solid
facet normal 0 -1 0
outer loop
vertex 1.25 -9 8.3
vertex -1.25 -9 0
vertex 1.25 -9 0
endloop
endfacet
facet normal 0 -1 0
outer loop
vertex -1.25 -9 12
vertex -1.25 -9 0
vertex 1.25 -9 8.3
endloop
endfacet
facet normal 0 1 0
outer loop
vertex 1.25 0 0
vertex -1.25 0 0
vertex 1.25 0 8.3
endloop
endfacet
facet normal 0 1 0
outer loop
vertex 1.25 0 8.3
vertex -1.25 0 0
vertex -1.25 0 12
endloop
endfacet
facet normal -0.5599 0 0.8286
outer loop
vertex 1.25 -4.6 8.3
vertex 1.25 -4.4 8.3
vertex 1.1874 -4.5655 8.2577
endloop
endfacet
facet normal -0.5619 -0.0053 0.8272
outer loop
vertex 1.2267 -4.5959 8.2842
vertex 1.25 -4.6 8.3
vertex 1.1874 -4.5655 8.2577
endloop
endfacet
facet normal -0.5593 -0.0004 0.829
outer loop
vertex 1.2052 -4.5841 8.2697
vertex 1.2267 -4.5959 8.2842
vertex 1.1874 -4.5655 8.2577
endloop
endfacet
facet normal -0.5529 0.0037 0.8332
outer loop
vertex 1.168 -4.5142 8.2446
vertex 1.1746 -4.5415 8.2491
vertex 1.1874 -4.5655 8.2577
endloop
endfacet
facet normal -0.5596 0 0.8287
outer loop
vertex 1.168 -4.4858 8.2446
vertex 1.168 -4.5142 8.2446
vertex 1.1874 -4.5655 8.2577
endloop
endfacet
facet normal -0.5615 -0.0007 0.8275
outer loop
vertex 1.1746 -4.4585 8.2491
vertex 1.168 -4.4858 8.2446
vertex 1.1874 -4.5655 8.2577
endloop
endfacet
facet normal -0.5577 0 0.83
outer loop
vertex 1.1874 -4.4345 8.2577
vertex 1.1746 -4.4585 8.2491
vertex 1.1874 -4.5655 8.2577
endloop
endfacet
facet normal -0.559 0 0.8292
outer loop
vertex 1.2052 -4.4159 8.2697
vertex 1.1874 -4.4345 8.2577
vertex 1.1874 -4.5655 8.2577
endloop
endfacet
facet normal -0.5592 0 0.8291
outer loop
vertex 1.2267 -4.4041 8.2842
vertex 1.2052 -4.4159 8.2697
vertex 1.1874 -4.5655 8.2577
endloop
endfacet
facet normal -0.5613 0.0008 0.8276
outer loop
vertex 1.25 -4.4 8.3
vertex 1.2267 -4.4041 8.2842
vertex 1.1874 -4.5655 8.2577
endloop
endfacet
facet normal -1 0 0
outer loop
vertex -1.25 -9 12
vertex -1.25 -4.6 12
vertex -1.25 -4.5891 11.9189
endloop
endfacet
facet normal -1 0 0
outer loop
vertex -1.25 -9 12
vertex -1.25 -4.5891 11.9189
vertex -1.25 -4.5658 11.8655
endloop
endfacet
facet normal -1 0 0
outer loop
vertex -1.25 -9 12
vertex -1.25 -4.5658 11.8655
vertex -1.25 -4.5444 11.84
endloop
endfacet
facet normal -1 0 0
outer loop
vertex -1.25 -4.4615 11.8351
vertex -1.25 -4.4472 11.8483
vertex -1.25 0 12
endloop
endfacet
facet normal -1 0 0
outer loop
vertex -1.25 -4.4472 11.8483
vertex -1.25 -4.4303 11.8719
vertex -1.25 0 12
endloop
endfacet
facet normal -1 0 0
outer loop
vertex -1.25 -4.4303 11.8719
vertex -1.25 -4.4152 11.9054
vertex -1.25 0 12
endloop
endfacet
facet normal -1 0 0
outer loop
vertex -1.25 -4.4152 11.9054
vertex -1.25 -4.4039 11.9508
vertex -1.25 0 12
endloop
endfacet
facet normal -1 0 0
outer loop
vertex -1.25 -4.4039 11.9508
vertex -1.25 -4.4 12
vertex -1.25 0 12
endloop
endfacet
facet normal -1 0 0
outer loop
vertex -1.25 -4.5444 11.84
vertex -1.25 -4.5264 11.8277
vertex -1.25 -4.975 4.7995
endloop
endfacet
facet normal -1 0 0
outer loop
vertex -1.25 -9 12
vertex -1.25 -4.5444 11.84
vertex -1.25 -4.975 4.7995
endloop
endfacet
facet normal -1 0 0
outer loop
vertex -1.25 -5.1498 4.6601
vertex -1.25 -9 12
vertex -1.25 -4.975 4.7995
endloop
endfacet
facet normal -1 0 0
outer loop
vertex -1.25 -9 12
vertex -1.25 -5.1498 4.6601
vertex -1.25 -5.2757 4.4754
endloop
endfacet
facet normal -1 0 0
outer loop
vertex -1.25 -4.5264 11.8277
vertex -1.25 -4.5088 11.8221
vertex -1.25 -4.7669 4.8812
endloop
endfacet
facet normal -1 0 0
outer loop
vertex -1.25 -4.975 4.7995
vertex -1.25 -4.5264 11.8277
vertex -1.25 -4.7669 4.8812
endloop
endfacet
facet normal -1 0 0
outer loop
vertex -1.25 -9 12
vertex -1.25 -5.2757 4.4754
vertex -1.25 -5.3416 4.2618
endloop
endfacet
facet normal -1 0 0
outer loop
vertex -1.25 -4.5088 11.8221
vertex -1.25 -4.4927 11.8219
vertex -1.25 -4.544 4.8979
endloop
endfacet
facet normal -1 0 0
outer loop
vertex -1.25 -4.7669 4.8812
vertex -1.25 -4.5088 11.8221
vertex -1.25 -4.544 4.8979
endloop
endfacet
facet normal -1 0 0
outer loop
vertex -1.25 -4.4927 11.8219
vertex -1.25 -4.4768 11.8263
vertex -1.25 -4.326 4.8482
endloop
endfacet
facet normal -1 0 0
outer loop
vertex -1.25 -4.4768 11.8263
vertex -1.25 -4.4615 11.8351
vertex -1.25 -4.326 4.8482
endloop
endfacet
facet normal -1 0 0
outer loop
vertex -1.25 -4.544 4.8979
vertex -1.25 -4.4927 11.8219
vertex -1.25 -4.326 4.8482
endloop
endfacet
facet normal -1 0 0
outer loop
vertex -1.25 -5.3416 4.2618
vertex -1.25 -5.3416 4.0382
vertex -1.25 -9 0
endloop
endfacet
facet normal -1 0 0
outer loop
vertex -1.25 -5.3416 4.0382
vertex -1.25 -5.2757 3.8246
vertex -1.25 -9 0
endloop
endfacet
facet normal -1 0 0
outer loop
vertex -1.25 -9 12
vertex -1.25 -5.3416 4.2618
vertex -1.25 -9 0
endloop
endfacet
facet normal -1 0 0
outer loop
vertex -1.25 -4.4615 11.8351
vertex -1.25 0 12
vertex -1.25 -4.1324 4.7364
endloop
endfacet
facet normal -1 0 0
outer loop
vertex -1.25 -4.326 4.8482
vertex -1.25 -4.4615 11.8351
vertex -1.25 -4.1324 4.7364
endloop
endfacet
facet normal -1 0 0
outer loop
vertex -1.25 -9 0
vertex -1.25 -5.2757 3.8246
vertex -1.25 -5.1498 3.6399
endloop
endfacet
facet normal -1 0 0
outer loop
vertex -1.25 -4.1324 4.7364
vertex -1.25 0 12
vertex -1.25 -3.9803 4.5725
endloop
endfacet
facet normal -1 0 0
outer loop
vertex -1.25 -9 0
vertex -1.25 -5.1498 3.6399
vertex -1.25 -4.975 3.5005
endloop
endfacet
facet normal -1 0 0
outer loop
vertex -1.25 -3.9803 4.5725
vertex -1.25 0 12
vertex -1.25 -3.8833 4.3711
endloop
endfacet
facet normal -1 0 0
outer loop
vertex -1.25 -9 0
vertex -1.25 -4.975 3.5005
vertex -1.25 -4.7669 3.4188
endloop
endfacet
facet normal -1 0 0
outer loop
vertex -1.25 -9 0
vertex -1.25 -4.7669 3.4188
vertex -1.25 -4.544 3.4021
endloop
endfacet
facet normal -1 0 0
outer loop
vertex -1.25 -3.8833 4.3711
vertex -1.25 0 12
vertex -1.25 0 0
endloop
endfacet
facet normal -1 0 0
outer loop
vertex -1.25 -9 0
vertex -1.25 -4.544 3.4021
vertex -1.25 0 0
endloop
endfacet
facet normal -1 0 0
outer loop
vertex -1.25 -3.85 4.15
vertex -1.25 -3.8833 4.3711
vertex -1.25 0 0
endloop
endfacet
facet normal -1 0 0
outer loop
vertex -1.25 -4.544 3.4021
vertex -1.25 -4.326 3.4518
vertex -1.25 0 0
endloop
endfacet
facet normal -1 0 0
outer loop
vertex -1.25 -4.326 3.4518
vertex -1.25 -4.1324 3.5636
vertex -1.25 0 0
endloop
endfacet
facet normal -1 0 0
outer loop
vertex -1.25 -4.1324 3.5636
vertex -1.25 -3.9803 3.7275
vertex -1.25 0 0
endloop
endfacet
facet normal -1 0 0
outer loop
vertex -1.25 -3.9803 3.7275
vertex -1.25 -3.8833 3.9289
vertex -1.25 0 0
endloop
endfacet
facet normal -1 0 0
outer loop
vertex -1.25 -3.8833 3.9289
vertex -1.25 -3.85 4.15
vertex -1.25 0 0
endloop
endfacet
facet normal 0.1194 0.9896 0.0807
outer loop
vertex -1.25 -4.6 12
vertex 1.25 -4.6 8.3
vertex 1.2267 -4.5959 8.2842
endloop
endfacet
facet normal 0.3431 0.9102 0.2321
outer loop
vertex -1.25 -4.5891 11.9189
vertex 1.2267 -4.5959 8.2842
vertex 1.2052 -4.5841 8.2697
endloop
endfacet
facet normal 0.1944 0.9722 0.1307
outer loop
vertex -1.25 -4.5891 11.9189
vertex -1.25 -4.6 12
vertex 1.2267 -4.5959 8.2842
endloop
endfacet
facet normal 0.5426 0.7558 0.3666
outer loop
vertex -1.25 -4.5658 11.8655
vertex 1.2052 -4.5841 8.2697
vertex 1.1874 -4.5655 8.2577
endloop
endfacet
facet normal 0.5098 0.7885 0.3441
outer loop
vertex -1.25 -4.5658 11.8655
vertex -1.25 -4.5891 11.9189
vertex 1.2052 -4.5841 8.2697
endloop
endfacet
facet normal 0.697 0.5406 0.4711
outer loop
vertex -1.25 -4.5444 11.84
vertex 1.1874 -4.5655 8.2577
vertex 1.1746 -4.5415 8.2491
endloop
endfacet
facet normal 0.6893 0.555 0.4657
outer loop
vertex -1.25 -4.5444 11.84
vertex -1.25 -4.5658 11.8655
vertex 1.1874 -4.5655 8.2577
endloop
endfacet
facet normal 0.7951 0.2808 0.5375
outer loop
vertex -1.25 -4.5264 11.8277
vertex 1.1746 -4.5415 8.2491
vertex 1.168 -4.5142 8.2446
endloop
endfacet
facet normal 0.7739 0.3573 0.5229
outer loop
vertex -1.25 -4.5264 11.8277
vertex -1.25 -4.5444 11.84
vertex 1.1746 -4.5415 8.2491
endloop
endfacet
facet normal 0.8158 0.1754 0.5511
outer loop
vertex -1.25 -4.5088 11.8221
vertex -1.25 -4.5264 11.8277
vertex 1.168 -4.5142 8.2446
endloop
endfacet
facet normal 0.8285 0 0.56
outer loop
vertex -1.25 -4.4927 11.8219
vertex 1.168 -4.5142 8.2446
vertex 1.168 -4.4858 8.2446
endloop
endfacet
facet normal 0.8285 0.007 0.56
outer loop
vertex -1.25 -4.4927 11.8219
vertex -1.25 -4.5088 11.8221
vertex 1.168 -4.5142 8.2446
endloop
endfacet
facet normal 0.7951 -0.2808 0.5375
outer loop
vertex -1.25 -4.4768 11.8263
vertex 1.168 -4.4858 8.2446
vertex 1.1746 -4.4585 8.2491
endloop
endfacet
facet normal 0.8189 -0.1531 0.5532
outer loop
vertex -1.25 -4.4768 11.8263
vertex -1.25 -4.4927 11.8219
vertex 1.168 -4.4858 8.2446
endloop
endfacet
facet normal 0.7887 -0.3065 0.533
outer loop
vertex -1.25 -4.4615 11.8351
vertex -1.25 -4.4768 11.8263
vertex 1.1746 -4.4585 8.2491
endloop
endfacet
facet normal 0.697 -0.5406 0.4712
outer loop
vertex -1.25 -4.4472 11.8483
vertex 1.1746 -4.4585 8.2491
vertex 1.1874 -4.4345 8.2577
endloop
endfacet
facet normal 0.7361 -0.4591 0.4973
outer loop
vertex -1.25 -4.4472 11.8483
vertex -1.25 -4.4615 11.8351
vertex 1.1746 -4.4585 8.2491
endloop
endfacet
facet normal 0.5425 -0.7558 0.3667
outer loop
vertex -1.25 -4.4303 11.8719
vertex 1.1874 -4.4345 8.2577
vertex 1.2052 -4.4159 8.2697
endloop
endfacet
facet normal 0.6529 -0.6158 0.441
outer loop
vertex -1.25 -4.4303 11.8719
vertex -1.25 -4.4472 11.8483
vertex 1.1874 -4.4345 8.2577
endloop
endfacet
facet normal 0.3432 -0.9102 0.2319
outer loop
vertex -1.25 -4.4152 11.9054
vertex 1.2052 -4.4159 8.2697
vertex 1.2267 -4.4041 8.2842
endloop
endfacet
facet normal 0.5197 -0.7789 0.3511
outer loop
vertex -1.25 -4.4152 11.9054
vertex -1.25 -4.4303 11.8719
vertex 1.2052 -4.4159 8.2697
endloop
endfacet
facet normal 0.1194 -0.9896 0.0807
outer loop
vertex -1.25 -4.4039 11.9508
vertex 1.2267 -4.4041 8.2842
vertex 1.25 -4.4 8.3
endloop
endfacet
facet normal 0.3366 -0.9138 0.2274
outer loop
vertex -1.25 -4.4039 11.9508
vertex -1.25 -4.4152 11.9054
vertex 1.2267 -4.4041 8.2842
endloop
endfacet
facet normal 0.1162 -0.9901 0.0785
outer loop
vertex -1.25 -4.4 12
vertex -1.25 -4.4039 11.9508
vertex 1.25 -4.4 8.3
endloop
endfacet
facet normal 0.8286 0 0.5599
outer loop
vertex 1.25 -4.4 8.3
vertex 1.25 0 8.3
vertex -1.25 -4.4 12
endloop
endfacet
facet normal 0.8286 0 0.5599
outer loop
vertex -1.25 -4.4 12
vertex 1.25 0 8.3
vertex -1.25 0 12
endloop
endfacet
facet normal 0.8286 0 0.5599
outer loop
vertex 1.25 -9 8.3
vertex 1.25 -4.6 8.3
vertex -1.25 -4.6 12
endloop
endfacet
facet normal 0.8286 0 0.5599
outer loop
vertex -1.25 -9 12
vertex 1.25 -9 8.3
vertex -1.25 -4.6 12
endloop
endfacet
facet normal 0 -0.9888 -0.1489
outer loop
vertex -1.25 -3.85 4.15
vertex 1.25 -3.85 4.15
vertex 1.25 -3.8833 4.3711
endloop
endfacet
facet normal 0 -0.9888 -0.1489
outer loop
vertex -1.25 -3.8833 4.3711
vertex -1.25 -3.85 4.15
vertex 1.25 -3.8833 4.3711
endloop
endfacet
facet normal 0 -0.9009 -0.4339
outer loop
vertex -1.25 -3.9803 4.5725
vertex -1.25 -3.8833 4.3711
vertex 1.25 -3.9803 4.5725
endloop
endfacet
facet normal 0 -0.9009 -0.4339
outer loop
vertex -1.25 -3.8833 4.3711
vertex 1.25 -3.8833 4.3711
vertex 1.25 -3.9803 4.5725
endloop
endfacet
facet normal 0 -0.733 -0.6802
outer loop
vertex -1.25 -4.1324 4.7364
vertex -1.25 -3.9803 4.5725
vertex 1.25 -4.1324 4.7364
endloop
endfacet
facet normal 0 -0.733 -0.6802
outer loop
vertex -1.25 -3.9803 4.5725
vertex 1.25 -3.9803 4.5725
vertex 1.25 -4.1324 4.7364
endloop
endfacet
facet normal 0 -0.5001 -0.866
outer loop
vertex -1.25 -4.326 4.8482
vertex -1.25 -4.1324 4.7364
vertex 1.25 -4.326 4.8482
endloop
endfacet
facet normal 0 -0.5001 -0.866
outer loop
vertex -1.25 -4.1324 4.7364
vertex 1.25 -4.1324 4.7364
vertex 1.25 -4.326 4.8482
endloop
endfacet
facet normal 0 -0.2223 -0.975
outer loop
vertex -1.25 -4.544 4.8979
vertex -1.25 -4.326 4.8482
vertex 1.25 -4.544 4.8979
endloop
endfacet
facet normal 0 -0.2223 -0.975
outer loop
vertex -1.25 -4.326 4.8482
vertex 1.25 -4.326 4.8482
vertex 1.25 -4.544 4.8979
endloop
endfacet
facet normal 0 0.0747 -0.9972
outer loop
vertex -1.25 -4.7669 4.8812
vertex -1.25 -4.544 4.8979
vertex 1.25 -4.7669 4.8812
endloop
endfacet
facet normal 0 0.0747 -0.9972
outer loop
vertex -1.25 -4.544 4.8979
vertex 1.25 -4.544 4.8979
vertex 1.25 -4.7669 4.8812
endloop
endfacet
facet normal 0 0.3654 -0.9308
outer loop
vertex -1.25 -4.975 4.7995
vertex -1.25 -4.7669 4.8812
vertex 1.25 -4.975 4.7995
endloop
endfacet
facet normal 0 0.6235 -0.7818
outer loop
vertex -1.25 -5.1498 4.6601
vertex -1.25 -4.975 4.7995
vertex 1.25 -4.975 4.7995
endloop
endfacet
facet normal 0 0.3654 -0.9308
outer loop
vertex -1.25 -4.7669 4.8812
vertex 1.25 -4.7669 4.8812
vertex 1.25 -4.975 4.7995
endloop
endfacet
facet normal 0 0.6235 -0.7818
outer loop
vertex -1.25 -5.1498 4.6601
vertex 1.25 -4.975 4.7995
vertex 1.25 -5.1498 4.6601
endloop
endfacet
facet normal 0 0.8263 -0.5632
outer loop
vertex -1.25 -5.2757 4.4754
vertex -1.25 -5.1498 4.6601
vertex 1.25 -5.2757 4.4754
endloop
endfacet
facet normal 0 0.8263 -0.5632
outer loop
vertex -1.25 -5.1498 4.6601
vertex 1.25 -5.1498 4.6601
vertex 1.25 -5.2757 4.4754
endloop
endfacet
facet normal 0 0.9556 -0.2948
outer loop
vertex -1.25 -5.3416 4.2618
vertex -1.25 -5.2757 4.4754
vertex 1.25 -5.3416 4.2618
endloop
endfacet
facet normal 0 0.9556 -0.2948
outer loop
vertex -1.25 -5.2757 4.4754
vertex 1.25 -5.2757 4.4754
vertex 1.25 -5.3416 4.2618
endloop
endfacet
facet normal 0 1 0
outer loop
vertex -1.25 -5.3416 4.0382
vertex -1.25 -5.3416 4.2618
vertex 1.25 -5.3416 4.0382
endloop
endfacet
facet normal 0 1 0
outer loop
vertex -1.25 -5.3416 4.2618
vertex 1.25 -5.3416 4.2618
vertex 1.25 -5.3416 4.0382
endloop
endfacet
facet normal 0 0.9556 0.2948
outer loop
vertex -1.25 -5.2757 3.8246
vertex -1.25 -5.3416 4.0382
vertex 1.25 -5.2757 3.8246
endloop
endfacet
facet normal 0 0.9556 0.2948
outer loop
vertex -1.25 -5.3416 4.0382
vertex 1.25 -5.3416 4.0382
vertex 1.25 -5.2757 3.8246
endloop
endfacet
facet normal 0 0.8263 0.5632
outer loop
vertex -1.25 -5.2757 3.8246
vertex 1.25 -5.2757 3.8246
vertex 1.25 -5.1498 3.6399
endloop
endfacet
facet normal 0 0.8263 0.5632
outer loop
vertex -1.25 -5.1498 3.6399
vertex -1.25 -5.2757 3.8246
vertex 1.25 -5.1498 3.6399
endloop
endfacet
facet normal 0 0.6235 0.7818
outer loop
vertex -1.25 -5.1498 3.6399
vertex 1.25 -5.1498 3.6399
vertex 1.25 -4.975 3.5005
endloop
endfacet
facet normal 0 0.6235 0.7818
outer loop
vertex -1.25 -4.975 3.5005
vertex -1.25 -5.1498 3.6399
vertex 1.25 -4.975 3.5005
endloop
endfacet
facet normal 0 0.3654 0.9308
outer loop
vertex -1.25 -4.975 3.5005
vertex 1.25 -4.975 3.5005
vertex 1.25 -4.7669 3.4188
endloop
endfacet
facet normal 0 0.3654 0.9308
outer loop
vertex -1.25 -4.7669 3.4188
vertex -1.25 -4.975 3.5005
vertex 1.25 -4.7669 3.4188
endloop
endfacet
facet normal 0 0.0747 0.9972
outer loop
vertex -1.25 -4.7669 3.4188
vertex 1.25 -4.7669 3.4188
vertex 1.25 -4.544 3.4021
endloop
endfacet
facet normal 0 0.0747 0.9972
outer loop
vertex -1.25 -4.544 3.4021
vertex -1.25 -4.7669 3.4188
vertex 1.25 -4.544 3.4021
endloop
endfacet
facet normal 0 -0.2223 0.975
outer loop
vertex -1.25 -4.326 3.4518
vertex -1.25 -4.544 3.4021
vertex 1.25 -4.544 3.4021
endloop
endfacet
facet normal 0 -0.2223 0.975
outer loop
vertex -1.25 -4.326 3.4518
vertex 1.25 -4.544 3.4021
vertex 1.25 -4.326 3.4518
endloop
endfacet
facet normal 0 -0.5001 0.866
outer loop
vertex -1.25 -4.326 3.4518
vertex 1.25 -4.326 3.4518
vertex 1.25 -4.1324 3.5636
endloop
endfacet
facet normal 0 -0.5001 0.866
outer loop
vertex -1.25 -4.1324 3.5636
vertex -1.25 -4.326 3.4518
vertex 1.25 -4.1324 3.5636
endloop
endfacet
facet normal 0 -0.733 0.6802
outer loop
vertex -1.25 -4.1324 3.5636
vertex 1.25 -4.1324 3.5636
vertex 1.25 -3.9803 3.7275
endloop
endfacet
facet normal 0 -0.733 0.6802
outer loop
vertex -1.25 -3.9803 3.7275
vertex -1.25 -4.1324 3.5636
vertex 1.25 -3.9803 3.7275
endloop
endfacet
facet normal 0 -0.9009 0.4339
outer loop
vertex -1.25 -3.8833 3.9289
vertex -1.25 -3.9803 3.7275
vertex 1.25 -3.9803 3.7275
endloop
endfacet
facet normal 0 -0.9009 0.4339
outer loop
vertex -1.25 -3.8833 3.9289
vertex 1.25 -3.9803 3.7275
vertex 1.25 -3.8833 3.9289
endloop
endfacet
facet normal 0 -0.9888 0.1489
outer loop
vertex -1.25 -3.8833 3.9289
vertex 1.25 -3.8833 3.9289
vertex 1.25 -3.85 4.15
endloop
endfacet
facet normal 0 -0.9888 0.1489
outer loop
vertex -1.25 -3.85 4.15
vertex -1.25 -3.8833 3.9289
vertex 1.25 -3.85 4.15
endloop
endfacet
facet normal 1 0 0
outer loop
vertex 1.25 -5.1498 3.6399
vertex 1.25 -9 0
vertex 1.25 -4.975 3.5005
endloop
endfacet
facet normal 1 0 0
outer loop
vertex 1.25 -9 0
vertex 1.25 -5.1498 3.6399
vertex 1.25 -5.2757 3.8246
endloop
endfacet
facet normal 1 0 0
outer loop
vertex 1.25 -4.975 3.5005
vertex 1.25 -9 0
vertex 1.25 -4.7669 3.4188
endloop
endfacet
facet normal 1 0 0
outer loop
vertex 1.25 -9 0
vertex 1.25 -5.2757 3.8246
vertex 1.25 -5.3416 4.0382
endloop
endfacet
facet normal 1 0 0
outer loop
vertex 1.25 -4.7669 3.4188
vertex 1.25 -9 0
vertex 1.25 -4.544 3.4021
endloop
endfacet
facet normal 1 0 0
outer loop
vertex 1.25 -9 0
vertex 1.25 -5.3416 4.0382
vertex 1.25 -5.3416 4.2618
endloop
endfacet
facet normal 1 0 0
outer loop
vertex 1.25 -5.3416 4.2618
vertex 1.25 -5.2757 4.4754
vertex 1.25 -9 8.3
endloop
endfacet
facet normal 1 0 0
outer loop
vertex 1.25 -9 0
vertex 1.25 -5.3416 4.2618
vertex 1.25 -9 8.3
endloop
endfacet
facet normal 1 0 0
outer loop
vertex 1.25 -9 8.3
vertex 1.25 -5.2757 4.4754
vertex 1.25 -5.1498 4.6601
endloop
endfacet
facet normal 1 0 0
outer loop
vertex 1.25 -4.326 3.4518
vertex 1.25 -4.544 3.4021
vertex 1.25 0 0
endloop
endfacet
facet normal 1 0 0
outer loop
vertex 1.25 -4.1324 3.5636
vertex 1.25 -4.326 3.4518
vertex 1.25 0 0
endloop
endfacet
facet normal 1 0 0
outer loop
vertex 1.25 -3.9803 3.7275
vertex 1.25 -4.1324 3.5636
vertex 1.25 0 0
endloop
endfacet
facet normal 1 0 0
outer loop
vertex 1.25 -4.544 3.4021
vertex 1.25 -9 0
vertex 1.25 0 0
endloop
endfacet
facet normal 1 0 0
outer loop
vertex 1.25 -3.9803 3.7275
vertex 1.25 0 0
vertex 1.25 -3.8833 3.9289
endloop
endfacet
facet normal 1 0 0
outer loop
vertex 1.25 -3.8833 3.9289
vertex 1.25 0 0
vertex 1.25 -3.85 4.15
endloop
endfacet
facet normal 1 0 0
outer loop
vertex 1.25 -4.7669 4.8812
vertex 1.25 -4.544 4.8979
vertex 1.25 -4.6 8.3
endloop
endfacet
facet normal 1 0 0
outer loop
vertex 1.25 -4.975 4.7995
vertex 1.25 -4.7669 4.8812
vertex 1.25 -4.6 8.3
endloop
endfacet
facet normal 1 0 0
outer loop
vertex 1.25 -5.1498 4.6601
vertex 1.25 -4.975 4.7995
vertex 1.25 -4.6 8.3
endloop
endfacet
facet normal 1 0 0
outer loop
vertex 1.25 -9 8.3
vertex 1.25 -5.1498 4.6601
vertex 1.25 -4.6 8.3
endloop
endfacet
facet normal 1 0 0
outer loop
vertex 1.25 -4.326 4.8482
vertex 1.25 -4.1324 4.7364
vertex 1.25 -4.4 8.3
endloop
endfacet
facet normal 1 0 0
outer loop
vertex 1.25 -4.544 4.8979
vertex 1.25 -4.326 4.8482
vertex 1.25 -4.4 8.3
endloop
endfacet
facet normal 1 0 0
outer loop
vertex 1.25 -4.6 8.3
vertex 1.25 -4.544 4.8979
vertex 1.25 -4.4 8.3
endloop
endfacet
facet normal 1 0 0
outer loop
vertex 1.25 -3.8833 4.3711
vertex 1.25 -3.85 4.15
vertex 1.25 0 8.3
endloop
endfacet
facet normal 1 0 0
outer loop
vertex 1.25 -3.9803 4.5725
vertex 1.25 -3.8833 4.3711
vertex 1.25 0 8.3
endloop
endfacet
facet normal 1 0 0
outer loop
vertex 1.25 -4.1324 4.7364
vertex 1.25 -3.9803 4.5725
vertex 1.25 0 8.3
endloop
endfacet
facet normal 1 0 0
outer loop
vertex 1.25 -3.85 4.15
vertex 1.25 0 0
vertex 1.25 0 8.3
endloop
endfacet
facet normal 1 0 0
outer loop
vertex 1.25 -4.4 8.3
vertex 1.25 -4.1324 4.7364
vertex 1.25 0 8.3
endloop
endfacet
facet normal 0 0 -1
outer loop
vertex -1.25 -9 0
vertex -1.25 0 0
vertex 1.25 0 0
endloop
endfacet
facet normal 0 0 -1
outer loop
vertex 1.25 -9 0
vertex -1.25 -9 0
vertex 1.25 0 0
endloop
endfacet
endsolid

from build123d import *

# Parameters (mm, degrees)
F1_DEPTH = 9
F2_W     = 0.1
F2_H     = 4.4654227124
F4_R     = 0.75
F5_DEPTH = 2.501


with BuildPart() as f1:
    # F0 (on Front) → F1 (new body)
    with BuildSketch(Plane.XZ):
        Polygon((-1.25, 12), (-1.25, 0), (1.25, 0), (1.25, 8.3), align=None)
    extrude(amount=F1_DEPTH)

    # F2 (on face) → F3 (revolve, cut)
    with BuildSketch(Plane(origin=(4.7085005015, 0, 3.1814192578), x_dir=(0, 1, 0), z_dir=(0.8285889687, 0, 0.5598574113))):
        with Locations((-4.55, 8.4101780322)):
            Rectangle(F2_W, F2_H)
    revolve(axis=Axis((0, -4.5, 10.15), (0.5598574113, 0, -0.8285889687)), mode=Mode.SUBTRACT)

    # F4 (on face) → F5 (cut, through all)
    with BuildSketch(Plane.YZ.offset(1.25)):
        with Locations((-4.6, 4.15)):
            Circle(F4_R)
    extrude(amount=-F5_DEPTH, mode=Mode.SUBTRACT)


solid = f1.part
